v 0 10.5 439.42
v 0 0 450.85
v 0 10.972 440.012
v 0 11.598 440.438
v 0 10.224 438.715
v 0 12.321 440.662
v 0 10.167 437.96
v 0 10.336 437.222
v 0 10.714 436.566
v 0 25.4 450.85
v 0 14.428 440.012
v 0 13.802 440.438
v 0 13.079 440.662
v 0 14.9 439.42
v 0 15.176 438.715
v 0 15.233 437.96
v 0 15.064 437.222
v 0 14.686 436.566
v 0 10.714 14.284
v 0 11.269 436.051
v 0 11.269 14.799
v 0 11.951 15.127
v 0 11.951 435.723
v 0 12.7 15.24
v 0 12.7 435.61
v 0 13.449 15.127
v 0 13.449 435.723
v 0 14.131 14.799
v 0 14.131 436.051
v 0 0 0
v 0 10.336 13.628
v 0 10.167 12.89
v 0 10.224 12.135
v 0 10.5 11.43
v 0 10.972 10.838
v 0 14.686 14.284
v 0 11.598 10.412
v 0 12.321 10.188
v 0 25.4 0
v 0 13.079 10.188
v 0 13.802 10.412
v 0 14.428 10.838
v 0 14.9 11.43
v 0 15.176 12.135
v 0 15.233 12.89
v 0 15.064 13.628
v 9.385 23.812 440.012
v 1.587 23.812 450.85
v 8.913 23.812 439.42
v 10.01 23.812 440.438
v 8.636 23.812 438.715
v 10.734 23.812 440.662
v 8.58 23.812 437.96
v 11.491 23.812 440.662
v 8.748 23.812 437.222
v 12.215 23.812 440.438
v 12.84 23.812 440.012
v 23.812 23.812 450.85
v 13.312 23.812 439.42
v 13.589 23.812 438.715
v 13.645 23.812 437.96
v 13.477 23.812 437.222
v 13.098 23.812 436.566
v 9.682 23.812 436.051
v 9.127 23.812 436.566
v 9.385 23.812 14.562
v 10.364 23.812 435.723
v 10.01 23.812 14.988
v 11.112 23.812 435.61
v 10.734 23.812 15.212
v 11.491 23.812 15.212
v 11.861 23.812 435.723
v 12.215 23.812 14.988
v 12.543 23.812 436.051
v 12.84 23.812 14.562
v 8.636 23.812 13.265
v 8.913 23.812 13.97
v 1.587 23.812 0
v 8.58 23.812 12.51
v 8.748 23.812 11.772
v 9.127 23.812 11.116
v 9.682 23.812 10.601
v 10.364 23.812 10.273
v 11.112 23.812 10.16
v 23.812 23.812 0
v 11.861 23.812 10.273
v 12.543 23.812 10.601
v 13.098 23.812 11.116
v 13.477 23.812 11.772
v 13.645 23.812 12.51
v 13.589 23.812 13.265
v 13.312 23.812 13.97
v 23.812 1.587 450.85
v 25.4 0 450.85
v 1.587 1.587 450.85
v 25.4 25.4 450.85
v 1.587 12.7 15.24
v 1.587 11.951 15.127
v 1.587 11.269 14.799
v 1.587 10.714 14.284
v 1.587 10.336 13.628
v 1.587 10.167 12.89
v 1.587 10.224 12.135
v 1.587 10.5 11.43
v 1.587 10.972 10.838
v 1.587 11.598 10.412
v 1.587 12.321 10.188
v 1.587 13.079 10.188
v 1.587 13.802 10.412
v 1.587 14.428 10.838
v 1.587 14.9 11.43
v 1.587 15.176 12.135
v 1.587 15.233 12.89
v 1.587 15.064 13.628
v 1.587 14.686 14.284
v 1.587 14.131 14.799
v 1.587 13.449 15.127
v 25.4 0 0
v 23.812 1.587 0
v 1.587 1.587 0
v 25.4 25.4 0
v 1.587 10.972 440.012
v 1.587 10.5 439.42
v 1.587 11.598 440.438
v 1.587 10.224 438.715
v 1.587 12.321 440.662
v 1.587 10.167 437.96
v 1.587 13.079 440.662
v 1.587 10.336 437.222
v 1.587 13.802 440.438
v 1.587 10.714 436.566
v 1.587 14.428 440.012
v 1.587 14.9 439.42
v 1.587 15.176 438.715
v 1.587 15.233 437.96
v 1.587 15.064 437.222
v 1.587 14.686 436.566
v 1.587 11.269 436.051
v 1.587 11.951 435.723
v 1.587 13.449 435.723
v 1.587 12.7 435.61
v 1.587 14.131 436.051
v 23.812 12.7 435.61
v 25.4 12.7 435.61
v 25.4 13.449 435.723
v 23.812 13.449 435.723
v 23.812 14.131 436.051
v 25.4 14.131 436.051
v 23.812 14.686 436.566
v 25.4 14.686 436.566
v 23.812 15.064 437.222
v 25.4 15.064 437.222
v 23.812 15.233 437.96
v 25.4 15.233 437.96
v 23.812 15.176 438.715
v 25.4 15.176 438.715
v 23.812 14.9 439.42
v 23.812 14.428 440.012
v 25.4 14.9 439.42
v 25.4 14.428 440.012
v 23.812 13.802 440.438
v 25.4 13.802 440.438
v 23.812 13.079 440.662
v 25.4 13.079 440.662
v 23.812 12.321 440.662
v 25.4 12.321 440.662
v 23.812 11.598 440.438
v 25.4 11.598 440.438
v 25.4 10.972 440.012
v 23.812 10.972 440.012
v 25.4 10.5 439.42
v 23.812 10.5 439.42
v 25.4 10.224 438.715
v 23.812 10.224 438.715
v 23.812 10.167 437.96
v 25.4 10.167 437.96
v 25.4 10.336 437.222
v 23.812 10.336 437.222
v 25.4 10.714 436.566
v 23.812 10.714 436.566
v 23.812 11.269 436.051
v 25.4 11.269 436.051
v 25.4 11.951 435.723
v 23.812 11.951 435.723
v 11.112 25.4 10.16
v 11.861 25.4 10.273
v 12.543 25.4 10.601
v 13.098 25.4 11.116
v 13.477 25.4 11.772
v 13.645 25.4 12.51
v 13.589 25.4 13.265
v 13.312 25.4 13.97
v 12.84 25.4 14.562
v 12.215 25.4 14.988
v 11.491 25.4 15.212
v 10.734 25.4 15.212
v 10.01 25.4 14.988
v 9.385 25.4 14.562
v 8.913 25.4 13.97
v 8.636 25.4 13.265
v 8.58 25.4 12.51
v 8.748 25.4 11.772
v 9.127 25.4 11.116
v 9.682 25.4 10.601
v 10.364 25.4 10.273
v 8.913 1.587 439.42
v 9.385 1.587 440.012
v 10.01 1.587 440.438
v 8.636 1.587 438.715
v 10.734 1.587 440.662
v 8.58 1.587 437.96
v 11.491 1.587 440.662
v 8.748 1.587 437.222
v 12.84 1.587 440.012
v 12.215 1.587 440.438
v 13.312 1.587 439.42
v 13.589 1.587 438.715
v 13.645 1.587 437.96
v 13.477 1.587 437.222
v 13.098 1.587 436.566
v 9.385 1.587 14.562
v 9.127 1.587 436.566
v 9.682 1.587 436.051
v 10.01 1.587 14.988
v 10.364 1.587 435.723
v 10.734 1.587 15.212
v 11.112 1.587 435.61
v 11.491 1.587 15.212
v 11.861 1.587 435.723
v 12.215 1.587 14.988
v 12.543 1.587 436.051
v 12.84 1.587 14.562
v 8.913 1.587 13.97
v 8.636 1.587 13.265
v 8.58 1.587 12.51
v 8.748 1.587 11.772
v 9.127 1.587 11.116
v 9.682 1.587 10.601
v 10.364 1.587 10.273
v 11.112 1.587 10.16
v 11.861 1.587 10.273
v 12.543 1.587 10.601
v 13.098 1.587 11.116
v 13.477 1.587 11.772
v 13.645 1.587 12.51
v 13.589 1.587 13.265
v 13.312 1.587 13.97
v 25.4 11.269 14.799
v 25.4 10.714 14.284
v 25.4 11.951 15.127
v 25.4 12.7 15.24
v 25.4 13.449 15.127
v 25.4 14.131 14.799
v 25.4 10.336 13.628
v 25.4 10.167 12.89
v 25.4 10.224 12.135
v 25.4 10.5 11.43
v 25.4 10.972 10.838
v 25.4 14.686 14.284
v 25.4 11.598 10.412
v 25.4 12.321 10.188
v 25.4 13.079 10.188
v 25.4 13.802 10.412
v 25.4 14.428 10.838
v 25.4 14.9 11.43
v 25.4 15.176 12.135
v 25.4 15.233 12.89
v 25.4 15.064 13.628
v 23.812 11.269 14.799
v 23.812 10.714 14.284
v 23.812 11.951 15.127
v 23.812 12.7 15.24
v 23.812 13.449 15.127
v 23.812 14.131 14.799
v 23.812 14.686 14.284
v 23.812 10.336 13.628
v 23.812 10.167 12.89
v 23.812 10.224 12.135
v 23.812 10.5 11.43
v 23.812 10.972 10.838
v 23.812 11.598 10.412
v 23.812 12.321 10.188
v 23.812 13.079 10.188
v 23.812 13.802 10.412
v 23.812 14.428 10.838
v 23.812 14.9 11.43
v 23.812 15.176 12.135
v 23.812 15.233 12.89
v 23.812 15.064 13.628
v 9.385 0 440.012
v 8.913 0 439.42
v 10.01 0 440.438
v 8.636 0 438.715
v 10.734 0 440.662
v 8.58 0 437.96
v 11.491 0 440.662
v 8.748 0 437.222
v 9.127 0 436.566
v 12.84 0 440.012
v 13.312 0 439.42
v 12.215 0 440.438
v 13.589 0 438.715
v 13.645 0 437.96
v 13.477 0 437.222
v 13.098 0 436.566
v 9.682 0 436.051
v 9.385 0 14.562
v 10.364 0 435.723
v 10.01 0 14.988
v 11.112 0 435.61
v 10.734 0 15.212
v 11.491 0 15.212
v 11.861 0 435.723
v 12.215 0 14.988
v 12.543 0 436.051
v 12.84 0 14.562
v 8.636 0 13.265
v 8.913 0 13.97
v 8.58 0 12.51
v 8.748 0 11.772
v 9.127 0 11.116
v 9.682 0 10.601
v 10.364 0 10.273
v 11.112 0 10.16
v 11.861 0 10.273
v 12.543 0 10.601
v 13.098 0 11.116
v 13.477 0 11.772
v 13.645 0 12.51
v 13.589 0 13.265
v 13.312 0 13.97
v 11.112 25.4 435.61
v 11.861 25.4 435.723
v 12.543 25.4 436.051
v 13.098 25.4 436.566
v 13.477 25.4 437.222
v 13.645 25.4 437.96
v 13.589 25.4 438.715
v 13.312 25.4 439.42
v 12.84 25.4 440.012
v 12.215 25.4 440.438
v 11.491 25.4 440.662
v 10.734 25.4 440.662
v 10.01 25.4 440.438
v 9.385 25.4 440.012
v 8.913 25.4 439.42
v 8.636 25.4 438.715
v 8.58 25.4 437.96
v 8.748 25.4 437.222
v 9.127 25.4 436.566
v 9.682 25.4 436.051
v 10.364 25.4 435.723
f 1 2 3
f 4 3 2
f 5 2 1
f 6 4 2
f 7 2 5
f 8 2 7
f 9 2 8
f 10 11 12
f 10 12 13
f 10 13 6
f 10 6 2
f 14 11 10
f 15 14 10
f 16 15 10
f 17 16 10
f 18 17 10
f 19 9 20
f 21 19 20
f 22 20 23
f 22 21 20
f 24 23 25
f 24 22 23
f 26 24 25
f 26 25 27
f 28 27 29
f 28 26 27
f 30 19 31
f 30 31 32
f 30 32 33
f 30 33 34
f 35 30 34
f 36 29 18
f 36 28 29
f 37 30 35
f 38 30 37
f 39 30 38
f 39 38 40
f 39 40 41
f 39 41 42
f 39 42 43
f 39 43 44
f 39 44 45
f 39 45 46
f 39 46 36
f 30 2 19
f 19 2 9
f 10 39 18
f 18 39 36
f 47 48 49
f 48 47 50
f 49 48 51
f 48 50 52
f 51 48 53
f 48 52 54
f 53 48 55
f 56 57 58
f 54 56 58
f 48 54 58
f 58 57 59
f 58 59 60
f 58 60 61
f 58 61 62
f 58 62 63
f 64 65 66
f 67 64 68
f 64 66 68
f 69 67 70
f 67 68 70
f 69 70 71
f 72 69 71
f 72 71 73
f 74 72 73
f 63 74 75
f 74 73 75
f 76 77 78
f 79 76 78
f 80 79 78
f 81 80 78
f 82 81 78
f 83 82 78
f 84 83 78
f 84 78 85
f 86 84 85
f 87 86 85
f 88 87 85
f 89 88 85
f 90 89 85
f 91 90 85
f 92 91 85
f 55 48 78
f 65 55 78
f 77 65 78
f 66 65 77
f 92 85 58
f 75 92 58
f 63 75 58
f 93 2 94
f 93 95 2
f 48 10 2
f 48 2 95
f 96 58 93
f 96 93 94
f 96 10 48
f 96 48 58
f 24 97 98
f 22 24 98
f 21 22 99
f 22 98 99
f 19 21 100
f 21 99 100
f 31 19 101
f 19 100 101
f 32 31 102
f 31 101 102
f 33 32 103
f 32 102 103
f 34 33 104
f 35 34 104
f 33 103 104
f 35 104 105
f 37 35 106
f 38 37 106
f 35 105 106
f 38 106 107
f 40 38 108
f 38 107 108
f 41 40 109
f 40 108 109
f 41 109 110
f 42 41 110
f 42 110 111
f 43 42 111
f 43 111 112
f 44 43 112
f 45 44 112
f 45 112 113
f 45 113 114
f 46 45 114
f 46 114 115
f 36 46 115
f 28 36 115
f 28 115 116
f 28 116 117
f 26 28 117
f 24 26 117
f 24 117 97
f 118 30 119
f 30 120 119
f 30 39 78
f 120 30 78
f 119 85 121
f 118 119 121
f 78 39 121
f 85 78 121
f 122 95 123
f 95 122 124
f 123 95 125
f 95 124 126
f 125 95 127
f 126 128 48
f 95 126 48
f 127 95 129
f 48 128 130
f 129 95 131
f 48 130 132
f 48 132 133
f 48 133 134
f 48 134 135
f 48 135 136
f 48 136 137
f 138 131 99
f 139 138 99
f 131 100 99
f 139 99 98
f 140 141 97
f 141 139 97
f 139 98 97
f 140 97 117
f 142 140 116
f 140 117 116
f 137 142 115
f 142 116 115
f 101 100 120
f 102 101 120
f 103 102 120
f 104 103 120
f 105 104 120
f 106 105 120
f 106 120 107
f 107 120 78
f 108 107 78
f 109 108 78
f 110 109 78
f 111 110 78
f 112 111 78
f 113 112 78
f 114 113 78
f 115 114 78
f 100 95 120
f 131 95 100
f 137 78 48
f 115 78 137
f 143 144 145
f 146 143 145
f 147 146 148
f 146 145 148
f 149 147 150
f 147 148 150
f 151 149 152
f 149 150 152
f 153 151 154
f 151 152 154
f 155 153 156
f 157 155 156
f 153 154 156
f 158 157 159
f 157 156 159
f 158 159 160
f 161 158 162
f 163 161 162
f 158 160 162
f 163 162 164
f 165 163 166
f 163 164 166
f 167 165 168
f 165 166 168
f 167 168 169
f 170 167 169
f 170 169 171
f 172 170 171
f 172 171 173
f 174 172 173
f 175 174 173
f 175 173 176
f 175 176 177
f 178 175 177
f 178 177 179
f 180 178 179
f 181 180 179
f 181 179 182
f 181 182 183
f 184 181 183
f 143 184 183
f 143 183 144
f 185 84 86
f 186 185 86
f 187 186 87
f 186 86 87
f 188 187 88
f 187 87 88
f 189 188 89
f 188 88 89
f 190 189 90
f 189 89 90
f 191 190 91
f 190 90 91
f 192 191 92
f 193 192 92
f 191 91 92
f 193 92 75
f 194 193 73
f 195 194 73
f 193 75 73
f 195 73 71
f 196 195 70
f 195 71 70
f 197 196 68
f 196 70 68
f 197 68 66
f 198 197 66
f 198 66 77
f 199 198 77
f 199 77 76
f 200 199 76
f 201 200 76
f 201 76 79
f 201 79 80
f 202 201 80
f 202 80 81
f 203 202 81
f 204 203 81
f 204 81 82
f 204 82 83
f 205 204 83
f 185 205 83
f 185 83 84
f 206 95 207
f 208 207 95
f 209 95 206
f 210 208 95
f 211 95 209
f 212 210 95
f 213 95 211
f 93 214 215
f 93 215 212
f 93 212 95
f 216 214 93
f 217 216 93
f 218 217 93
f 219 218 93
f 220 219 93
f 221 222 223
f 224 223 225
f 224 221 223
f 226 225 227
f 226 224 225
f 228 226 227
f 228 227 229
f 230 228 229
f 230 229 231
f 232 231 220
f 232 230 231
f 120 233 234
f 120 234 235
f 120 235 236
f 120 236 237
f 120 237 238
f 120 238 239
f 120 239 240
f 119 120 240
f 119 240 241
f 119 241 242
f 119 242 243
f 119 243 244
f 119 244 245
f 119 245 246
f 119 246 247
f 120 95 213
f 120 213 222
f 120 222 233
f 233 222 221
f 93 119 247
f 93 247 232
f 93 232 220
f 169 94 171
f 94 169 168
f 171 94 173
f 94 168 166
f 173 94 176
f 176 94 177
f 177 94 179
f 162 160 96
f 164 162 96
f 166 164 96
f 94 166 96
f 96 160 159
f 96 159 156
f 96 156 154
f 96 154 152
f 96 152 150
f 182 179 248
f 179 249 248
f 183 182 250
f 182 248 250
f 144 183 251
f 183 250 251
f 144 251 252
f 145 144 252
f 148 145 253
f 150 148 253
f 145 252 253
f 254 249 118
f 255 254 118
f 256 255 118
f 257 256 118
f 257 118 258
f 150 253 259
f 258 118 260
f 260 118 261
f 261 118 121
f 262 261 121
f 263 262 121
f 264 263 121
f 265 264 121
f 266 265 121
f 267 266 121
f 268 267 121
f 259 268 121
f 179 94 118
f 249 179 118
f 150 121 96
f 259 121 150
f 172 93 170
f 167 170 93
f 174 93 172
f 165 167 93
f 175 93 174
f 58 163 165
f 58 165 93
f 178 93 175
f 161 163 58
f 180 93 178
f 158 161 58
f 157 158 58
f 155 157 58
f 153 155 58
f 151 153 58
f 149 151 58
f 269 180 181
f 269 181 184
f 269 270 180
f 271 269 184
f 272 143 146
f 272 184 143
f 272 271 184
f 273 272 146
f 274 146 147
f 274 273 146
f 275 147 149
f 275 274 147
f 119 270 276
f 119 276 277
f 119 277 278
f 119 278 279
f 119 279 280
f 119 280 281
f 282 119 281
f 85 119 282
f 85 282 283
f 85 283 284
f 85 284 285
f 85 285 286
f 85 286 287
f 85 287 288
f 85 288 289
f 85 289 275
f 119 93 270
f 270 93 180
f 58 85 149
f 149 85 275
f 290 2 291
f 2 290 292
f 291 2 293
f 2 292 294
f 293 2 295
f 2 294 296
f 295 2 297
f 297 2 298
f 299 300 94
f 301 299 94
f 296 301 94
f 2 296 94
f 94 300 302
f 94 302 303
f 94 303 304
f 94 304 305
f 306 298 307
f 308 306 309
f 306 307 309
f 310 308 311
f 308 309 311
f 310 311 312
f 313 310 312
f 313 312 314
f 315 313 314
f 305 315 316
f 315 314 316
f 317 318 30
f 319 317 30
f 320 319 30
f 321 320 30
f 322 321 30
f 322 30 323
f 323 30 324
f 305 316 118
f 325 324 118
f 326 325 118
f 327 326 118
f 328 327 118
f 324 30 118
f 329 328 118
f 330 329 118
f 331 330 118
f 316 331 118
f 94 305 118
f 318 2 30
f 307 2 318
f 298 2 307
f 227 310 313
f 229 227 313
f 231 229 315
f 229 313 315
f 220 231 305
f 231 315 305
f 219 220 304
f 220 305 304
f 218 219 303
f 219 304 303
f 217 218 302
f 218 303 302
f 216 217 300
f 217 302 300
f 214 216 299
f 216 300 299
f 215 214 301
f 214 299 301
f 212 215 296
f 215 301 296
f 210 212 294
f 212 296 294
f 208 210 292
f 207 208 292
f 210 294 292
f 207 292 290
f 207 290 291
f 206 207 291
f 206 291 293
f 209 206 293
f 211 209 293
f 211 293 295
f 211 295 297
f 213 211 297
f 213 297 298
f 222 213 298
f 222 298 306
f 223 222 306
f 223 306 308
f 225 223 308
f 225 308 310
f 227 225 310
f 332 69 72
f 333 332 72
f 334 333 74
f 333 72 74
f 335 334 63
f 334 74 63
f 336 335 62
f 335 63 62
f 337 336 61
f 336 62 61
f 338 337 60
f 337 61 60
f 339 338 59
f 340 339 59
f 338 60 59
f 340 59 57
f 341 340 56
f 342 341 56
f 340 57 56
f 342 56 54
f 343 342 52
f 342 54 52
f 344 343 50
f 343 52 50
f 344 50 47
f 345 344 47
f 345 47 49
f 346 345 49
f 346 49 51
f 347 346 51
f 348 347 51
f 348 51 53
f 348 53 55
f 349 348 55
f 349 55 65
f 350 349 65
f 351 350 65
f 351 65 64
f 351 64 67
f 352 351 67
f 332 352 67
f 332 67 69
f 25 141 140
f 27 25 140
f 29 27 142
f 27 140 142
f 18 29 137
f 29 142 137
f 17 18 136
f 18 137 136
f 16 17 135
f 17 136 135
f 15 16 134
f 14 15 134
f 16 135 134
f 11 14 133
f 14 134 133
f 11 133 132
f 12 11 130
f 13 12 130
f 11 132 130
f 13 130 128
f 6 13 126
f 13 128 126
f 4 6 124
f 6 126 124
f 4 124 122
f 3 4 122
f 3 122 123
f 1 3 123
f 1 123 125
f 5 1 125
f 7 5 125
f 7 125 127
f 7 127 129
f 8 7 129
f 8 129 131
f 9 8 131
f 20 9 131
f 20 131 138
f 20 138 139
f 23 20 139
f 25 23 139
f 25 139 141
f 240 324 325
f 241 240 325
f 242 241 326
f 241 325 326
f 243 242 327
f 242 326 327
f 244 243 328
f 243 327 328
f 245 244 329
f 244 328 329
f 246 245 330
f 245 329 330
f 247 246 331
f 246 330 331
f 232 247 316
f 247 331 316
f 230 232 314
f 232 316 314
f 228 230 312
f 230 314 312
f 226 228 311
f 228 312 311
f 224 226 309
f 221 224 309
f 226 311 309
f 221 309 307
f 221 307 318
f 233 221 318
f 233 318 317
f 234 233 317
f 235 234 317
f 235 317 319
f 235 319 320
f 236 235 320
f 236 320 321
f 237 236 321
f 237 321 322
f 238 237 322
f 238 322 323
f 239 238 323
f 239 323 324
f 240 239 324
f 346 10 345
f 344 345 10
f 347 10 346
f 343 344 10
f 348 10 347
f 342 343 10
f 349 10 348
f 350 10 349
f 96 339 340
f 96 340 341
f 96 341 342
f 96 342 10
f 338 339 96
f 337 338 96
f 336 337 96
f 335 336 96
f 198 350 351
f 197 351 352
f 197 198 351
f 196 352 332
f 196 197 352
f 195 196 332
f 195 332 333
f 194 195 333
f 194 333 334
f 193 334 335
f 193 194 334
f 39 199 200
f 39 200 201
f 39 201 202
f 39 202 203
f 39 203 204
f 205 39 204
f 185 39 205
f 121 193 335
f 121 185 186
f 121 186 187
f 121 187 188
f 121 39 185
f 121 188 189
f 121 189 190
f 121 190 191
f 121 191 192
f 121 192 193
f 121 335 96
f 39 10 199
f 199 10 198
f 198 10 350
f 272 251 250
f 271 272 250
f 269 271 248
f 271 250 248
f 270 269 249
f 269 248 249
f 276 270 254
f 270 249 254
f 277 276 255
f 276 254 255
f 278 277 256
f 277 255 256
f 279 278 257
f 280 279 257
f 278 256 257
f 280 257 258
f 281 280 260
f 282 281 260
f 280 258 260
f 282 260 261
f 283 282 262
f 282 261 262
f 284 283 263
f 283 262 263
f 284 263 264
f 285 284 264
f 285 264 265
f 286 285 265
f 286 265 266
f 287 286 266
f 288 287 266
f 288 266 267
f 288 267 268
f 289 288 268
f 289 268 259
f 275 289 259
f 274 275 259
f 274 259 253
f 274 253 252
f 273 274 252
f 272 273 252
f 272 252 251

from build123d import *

# Parameters (mm, degrees)
SKETCH1_W           = 25.4
SKETCH1_H           = 25.4
SKETCH1_W_2         = 22.225
SKETCH1_H_2         = 22.225
BOSS_EXTRUDE1_DEPTH = 450.85
SKETCH4_R           = 2.54
CUT_EXTRUDE3_DEPTH  = 453.278722139
SKETCH5_R           = 2.54
CUT_EXTRUDE4_DEPTH  = 453.278722139


with BuildPart() as part:
    # Sketch1 → Boss-Extrude1 (new body)
    with BuildSketch(Plane.XY):
        with Locations((12.7, 12.7)):
            Rectangle(SKETCH1_W, SKETCH1_H)
        with Locations((12.7, 12.7)):
            Rectangle(SKETCH1_W_2, SKETCH1_H_2, mode=Mode.SUBTRACT)
    extrude(amount=BOSS_EXTRUDE1_DEPTH)

    # Sketch4 → Cut-Extrude3 (cut, through all)
    with BuildSketch(Plane(origin=(25.4, 0, 0), x_dir=(0, 0, -1), z_dir=(1, 0, 0))):
        with Locations((-438.15, 12.7)):
            Circle(SKETCH4_R)
        with Locations(Location((-12.7, 12.7, 0), (0, 0, 180))):
            Circle(SKETCH4_R)
    extrude(amount=-CUT_EXTRUDE3_DEPTH, mode=Mode.SUBTRACT)

    # Sketch5 → Cut-Extrude4 (cut, through all)
    with BuildSketch(Plane.XZ):
        with Locations(Location((11.1125, 438.15, 0), (0, 0, 270))):
            Circle(SKETCH5_R)
        with Locations(Location((11.1125, 12.7, 0), (0, 0, 270))):
            Circle(SKETCH5_R)
    extrude(amount=-CUT_EXTRUDE4_DEPTH, mode=Mode.SUBTRACT)


solid = part.part
